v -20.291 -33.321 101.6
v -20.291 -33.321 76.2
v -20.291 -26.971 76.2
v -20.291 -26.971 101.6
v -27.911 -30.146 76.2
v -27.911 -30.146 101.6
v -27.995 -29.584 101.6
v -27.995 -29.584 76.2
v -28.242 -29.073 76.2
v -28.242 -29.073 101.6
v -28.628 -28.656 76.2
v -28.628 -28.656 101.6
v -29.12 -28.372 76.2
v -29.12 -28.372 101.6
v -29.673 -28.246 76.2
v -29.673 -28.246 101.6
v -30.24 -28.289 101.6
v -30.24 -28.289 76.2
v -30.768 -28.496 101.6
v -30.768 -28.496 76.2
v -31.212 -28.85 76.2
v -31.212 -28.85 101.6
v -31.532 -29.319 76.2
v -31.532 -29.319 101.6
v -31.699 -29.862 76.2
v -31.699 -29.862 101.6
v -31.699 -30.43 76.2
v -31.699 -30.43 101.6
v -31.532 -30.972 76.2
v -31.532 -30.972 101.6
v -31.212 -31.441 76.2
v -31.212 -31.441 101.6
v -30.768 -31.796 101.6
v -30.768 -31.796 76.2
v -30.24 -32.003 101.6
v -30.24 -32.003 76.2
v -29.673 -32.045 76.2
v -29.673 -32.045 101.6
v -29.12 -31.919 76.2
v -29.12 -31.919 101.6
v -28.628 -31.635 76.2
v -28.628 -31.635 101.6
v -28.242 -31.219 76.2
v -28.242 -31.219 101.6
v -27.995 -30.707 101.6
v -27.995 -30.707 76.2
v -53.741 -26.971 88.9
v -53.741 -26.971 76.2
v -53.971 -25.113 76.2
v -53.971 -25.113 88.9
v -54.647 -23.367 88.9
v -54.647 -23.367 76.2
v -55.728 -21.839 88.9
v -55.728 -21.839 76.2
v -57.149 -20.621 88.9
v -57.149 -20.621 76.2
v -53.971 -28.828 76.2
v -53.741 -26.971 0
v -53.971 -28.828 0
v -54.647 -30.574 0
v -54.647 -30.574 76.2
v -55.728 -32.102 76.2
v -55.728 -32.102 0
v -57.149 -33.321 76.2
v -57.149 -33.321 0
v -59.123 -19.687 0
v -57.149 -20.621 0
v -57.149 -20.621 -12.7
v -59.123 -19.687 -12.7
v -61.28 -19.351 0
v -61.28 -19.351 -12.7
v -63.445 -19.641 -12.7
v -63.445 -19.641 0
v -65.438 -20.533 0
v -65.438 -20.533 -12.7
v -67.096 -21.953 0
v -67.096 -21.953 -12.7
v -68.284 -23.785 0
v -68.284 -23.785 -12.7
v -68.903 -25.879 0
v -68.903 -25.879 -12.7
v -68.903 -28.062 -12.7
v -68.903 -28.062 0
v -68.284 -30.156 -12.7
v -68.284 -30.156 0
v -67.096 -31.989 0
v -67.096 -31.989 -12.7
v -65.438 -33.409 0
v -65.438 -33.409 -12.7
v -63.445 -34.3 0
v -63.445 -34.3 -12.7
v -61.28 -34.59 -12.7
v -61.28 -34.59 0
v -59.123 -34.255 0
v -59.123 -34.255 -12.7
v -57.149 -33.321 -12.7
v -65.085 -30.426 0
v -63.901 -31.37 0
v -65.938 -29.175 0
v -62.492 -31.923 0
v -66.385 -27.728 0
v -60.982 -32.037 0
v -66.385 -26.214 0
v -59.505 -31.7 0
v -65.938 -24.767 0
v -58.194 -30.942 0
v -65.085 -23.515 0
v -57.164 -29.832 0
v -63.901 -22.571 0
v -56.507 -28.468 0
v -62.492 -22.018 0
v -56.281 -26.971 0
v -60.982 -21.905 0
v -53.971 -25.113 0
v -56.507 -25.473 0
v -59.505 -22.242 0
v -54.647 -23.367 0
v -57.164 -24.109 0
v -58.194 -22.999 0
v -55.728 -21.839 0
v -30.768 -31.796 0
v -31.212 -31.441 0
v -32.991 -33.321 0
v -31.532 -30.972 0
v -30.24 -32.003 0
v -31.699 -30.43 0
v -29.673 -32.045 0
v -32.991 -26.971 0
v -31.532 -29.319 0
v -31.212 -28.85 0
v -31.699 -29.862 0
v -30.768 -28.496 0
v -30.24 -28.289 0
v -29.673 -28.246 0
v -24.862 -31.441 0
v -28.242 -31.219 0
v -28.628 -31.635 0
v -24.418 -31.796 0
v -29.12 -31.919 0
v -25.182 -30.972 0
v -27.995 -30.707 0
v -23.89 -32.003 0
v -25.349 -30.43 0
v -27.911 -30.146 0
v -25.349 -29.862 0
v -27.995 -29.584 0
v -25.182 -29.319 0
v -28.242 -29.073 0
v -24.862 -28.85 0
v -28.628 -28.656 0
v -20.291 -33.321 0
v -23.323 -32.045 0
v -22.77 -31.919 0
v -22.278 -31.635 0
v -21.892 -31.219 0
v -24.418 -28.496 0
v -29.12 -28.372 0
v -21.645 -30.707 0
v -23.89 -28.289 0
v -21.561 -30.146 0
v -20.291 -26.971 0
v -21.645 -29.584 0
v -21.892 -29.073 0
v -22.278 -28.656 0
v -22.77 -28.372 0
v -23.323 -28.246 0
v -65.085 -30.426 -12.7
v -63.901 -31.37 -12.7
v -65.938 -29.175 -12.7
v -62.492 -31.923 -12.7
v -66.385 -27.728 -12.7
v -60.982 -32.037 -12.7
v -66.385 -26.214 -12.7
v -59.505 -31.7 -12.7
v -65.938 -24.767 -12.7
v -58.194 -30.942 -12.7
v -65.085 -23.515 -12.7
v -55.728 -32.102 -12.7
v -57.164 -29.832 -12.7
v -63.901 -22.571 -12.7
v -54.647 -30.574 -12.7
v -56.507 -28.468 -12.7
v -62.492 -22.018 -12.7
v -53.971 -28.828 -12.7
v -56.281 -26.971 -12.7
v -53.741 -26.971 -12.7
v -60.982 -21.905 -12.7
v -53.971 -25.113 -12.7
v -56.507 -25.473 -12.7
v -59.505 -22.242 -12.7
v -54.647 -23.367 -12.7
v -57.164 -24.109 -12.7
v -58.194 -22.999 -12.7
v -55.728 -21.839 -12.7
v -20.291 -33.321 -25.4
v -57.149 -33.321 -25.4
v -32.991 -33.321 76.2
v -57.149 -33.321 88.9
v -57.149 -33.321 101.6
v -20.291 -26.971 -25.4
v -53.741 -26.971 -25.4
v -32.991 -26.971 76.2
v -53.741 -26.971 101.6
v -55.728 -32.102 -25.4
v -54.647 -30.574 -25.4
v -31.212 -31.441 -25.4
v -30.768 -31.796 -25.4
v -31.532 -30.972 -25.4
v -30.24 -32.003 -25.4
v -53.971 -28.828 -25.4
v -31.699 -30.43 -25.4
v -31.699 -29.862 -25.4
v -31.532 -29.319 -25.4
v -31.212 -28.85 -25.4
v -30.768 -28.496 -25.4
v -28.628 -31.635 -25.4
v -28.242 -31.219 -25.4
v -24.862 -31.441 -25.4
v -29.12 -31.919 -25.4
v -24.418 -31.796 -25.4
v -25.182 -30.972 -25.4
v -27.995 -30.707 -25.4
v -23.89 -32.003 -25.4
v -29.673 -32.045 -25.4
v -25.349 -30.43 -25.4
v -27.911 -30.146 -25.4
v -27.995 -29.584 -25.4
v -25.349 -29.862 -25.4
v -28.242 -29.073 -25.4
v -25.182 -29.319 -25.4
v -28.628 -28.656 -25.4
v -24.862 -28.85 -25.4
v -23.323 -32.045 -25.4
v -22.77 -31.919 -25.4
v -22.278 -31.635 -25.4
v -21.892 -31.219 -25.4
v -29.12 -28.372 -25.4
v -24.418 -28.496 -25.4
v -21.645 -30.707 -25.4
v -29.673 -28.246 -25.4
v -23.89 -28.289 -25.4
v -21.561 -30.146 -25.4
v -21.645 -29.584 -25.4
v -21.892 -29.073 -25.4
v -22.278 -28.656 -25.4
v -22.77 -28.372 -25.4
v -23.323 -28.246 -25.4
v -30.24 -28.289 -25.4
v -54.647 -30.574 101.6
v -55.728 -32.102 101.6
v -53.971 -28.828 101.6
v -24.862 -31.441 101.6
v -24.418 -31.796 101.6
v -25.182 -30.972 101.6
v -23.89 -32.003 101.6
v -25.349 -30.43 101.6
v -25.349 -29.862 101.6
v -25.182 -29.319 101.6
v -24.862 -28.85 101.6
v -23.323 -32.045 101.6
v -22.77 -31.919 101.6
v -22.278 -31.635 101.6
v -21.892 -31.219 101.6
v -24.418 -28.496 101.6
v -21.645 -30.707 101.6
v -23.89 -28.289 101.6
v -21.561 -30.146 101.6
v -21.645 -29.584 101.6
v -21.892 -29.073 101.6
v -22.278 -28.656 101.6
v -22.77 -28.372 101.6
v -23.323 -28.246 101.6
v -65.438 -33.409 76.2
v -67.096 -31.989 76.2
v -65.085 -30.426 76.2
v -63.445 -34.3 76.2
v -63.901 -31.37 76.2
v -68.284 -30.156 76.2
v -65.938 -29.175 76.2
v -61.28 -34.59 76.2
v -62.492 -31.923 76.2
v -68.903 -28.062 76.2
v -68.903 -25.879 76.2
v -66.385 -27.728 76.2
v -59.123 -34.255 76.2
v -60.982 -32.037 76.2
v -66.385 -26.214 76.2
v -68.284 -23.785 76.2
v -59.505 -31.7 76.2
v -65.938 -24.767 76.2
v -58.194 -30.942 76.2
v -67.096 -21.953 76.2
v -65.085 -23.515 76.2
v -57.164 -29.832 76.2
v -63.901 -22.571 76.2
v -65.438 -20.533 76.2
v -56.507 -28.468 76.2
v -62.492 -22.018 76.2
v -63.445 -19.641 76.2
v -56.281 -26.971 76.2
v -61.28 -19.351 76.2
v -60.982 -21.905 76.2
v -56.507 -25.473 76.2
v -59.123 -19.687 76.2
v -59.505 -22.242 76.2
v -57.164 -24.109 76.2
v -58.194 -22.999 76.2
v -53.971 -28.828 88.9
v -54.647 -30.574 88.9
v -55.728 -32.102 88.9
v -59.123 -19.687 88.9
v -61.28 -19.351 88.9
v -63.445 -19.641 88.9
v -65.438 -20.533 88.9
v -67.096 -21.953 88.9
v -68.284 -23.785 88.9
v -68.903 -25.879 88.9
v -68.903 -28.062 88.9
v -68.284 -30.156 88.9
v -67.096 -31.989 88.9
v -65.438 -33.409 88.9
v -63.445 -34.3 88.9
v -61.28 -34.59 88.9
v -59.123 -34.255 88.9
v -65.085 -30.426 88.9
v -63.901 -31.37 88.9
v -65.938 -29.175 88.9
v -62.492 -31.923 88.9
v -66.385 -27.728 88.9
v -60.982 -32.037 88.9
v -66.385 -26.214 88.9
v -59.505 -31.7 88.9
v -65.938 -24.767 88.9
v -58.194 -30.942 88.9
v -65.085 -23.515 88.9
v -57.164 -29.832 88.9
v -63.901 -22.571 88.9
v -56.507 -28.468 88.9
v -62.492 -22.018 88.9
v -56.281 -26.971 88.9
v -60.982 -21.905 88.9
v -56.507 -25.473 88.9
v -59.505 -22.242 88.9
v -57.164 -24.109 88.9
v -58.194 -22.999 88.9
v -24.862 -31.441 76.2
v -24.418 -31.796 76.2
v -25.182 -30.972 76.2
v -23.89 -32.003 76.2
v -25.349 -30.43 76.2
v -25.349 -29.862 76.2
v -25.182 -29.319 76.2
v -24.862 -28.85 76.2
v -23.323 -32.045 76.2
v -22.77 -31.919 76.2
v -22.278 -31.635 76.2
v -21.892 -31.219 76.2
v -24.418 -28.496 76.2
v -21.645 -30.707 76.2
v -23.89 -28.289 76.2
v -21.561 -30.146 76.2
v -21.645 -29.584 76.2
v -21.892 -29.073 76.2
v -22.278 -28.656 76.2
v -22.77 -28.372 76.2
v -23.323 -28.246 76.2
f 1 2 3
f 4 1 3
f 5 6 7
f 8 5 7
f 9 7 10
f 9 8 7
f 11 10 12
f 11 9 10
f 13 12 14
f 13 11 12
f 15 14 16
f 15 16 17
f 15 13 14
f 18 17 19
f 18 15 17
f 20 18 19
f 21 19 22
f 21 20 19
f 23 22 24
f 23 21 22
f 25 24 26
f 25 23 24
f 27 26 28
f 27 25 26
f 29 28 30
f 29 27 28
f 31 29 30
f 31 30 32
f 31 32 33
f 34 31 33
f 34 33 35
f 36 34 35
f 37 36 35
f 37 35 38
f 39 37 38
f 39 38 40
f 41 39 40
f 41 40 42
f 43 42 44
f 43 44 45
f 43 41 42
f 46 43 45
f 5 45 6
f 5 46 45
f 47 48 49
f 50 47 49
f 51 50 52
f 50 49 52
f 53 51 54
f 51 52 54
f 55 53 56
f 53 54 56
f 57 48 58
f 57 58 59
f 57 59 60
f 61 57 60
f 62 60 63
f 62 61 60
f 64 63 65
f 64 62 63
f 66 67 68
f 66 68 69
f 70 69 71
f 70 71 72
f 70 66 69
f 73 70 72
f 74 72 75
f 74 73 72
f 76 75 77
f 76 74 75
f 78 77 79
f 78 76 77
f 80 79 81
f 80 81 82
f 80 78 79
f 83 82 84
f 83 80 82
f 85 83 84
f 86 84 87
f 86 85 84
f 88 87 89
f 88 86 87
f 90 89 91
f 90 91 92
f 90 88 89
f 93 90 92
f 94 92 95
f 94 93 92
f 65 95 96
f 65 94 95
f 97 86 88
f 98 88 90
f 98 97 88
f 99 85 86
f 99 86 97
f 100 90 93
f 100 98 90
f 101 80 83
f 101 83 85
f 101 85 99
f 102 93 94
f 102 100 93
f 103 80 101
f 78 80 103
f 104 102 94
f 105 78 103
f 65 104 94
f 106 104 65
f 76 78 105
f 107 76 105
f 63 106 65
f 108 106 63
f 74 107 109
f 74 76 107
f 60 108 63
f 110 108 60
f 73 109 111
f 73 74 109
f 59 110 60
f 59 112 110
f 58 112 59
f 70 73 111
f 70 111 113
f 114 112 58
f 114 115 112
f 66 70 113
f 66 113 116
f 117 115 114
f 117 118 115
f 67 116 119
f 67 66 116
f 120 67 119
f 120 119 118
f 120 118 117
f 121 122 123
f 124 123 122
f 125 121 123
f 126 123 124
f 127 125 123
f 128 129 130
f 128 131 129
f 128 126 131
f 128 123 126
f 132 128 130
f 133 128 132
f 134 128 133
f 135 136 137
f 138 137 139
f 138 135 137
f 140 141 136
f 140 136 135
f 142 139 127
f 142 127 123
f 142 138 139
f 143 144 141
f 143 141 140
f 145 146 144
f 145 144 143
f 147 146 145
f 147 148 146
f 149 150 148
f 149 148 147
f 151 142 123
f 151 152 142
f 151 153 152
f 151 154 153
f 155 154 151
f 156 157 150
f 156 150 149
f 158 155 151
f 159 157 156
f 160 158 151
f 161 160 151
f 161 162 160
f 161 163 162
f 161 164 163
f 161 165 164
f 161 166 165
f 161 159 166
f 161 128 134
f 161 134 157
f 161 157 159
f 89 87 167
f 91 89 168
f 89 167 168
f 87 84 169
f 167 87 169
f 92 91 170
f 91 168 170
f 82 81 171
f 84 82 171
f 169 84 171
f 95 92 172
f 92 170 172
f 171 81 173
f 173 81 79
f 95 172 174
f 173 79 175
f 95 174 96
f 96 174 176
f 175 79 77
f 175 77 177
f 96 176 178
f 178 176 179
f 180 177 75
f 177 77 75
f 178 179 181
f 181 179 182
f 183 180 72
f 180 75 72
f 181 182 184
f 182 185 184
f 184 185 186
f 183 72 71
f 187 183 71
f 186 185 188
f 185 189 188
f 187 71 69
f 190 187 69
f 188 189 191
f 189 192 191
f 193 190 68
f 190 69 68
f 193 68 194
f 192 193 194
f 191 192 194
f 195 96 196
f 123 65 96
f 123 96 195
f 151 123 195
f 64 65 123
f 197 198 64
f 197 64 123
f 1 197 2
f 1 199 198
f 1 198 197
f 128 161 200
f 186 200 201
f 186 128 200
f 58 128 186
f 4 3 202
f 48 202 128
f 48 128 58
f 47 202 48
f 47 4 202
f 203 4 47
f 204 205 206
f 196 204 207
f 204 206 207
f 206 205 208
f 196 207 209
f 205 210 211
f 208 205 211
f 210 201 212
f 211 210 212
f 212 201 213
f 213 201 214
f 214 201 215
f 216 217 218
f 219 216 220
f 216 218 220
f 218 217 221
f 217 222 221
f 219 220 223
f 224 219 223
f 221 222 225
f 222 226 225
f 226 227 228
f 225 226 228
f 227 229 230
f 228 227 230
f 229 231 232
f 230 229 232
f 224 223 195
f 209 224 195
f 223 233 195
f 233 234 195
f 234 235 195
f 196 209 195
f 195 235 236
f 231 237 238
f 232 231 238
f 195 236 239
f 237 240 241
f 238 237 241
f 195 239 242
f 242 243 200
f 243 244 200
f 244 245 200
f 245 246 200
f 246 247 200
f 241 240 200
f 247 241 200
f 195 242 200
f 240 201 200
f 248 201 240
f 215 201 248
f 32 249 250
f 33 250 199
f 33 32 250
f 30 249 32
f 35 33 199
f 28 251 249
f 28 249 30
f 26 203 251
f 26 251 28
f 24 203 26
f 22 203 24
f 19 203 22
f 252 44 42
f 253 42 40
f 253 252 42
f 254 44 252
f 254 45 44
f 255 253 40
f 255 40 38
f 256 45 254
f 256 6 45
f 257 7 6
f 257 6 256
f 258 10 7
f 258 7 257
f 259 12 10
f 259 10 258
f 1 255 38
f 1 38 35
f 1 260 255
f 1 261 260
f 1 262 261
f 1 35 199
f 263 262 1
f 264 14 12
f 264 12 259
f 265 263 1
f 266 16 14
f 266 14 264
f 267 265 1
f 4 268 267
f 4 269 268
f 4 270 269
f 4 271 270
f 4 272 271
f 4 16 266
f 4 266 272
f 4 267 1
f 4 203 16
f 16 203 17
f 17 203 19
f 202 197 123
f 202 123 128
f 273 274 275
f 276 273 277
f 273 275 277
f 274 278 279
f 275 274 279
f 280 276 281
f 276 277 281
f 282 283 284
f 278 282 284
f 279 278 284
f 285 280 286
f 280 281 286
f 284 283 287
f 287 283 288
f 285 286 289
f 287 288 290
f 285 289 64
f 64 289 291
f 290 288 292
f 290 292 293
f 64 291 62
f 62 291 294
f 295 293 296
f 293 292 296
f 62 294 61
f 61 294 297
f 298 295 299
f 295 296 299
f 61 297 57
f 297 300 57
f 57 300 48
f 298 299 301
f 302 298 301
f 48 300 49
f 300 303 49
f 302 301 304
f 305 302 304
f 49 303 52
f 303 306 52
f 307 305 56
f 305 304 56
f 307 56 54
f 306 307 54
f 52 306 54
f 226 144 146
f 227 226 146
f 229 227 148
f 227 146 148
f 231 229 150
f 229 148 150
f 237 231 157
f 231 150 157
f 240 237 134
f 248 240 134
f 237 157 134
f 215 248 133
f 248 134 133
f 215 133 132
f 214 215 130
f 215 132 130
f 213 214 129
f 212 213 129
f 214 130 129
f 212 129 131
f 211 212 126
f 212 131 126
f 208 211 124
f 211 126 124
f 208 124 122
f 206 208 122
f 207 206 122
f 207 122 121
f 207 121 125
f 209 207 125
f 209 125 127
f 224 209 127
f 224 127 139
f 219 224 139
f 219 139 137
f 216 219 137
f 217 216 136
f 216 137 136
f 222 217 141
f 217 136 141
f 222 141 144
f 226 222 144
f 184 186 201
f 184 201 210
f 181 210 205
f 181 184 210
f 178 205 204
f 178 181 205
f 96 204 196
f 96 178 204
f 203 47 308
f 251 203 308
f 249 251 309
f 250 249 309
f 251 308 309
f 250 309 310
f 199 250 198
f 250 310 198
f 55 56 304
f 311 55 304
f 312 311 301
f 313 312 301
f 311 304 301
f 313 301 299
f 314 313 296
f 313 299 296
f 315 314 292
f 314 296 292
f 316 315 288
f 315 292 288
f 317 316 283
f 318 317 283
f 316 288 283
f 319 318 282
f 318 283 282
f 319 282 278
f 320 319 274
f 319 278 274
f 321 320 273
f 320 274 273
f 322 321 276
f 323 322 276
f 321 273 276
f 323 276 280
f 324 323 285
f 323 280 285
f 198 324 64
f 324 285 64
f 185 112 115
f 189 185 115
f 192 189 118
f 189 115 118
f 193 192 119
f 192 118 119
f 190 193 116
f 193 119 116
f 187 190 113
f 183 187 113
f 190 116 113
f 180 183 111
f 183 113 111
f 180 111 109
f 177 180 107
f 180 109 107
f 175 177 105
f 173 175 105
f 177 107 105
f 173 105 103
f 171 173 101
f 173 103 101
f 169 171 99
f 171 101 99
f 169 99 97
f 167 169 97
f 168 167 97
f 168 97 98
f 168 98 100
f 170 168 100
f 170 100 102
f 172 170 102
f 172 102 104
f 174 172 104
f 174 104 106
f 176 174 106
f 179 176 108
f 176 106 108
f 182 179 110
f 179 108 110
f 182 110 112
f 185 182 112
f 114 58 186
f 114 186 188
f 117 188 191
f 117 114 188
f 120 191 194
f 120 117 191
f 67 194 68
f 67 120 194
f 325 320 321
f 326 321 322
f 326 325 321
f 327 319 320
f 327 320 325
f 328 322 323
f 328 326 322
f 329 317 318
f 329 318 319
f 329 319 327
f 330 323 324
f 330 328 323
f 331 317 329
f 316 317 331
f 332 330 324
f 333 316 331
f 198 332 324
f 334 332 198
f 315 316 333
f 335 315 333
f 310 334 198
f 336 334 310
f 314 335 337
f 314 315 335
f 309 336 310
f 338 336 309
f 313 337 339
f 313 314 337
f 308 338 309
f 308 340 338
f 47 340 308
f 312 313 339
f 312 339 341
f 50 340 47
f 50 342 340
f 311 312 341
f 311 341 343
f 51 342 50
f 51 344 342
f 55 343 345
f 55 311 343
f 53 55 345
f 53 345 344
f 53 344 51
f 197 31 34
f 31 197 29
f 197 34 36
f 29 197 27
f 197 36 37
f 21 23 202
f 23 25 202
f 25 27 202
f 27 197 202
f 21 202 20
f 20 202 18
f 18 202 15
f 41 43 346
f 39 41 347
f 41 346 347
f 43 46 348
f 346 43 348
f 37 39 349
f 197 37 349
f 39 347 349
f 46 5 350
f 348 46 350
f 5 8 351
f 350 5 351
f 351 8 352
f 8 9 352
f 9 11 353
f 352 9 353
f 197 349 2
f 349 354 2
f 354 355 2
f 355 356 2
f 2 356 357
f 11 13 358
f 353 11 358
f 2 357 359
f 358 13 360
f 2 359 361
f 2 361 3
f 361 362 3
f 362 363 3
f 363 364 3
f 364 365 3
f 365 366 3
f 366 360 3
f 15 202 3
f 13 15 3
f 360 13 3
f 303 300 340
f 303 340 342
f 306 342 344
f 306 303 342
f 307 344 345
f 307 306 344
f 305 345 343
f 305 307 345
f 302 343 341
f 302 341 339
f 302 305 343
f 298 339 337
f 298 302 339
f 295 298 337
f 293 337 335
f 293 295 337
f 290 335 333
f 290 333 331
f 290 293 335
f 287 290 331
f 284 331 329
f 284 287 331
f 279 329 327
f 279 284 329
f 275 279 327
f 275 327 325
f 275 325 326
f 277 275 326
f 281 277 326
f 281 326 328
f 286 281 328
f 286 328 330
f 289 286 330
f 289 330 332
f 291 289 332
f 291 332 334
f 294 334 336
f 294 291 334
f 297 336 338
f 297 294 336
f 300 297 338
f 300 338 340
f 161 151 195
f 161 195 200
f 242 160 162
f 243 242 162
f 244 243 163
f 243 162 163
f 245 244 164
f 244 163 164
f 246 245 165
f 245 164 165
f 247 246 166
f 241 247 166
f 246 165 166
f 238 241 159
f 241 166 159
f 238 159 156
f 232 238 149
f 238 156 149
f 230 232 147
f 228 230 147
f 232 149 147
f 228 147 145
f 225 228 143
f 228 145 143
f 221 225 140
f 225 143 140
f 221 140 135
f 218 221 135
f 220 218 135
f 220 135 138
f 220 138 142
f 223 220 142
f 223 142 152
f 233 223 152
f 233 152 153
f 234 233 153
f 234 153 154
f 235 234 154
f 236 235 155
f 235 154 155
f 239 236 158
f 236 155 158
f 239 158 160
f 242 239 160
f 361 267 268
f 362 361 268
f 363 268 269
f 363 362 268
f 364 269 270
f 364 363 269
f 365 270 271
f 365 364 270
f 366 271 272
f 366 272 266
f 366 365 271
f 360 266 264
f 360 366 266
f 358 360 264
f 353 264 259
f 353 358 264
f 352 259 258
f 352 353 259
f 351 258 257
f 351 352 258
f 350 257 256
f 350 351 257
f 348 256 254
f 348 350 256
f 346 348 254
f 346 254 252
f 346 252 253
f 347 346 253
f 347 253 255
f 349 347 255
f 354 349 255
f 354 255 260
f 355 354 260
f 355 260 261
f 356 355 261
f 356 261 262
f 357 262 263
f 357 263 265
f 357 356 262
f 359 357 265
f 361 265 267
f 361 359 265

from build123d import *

# Parameters (mm, degrees)
F0_W     = 6.35
F0_H     = 6.35
F0_R     = 1.905
F1_DEPTH = 25.4
F0_R_2   = 5.08
F2_DEPTH = 12.7
F3_DEPTH = 38.1


with BuildPart() as f1:
    # F0 (on Top) → F1 (new body)
    with BuildSketch(Plane.XY):
        with BuildLine():
            Line((-57.149317, -33.320757), (-32.990752, -33.320757))
            Line((-32.990752, -33.320757), (-32.990752, -26.970757))
            Line((-32.990752, -26.970757), (-53.74143, -26.970757))
            ThreePointArc((-53.74143, -26.970757), (-54.64724, -30.574096), (-57.149317, -33.320757))
        make_face()
        with Locations((-29.815752, -30.145757)):
            Rectangle(F0_W, F0_H)
        with Locations((-29.815752, -30.145757)):
            Circle(F0_R, mode=Mode.SUBTRACT)
        with Locations((-23.465752, -30.145757)):
            Rectangle(F0_W, F0_H)
        with Locations((-23.465752, -30.145757)):
            Circle(F0_R, mode=Mode.SUBTRACT)
    extrude(amount=-F1_DEPTH)

    # F0 (on Top) → F2 (join)
    with BuildSketch(Plane.XY):
        with BuildLine():
            ThreePointArc((-57.149317, -20.620757), (-68.98143, -26.970757), (-57.149317, -33.320757))
            ThreePointArc((-57.149317, -33.320757), (-54.64724, -30.574096), (-53.74143, -26.970757))
            ThreePointArc((-53.74143, -26.970757), (-54.64724, -23.367419), (-57.149317, -20.620757))
        make_face()
        with Locations((-61.36143, -26.970757)):
            Circle(F0_R_2, mode=Mode.SUBTRACT)
    extrude(amount=-F2_DEPTH)

    # F0 (on Top) → F3 (join)
    with BuildSketch(Plane.XY):
        with BuildLine():
            Line((-57.149317, -33.320757), (-32.990752, -33.320757))
            Line((-32.990752, -33.320757), (-32.990752, -26.970757))
            Line((-32.990752, -26.970757), (-53.74143, -26.970757))
            ThreePointArc((-53.74143, -26.970757), (-54.64724, -30.574096), (-57.149317, -33.320757))
        make_face()
    extrude(amount=F3_DEPTH)

    # F4: F1 across face


with BuildPart() as f1_1:
    add(f1.part)
    add(f1.part.mirror(Plane(origin=(-43.892507, -30.223136, 38.1), x_dir=(1, 0, 0), z_dir=(0, 0, 1))))


solid = f1_1.part
